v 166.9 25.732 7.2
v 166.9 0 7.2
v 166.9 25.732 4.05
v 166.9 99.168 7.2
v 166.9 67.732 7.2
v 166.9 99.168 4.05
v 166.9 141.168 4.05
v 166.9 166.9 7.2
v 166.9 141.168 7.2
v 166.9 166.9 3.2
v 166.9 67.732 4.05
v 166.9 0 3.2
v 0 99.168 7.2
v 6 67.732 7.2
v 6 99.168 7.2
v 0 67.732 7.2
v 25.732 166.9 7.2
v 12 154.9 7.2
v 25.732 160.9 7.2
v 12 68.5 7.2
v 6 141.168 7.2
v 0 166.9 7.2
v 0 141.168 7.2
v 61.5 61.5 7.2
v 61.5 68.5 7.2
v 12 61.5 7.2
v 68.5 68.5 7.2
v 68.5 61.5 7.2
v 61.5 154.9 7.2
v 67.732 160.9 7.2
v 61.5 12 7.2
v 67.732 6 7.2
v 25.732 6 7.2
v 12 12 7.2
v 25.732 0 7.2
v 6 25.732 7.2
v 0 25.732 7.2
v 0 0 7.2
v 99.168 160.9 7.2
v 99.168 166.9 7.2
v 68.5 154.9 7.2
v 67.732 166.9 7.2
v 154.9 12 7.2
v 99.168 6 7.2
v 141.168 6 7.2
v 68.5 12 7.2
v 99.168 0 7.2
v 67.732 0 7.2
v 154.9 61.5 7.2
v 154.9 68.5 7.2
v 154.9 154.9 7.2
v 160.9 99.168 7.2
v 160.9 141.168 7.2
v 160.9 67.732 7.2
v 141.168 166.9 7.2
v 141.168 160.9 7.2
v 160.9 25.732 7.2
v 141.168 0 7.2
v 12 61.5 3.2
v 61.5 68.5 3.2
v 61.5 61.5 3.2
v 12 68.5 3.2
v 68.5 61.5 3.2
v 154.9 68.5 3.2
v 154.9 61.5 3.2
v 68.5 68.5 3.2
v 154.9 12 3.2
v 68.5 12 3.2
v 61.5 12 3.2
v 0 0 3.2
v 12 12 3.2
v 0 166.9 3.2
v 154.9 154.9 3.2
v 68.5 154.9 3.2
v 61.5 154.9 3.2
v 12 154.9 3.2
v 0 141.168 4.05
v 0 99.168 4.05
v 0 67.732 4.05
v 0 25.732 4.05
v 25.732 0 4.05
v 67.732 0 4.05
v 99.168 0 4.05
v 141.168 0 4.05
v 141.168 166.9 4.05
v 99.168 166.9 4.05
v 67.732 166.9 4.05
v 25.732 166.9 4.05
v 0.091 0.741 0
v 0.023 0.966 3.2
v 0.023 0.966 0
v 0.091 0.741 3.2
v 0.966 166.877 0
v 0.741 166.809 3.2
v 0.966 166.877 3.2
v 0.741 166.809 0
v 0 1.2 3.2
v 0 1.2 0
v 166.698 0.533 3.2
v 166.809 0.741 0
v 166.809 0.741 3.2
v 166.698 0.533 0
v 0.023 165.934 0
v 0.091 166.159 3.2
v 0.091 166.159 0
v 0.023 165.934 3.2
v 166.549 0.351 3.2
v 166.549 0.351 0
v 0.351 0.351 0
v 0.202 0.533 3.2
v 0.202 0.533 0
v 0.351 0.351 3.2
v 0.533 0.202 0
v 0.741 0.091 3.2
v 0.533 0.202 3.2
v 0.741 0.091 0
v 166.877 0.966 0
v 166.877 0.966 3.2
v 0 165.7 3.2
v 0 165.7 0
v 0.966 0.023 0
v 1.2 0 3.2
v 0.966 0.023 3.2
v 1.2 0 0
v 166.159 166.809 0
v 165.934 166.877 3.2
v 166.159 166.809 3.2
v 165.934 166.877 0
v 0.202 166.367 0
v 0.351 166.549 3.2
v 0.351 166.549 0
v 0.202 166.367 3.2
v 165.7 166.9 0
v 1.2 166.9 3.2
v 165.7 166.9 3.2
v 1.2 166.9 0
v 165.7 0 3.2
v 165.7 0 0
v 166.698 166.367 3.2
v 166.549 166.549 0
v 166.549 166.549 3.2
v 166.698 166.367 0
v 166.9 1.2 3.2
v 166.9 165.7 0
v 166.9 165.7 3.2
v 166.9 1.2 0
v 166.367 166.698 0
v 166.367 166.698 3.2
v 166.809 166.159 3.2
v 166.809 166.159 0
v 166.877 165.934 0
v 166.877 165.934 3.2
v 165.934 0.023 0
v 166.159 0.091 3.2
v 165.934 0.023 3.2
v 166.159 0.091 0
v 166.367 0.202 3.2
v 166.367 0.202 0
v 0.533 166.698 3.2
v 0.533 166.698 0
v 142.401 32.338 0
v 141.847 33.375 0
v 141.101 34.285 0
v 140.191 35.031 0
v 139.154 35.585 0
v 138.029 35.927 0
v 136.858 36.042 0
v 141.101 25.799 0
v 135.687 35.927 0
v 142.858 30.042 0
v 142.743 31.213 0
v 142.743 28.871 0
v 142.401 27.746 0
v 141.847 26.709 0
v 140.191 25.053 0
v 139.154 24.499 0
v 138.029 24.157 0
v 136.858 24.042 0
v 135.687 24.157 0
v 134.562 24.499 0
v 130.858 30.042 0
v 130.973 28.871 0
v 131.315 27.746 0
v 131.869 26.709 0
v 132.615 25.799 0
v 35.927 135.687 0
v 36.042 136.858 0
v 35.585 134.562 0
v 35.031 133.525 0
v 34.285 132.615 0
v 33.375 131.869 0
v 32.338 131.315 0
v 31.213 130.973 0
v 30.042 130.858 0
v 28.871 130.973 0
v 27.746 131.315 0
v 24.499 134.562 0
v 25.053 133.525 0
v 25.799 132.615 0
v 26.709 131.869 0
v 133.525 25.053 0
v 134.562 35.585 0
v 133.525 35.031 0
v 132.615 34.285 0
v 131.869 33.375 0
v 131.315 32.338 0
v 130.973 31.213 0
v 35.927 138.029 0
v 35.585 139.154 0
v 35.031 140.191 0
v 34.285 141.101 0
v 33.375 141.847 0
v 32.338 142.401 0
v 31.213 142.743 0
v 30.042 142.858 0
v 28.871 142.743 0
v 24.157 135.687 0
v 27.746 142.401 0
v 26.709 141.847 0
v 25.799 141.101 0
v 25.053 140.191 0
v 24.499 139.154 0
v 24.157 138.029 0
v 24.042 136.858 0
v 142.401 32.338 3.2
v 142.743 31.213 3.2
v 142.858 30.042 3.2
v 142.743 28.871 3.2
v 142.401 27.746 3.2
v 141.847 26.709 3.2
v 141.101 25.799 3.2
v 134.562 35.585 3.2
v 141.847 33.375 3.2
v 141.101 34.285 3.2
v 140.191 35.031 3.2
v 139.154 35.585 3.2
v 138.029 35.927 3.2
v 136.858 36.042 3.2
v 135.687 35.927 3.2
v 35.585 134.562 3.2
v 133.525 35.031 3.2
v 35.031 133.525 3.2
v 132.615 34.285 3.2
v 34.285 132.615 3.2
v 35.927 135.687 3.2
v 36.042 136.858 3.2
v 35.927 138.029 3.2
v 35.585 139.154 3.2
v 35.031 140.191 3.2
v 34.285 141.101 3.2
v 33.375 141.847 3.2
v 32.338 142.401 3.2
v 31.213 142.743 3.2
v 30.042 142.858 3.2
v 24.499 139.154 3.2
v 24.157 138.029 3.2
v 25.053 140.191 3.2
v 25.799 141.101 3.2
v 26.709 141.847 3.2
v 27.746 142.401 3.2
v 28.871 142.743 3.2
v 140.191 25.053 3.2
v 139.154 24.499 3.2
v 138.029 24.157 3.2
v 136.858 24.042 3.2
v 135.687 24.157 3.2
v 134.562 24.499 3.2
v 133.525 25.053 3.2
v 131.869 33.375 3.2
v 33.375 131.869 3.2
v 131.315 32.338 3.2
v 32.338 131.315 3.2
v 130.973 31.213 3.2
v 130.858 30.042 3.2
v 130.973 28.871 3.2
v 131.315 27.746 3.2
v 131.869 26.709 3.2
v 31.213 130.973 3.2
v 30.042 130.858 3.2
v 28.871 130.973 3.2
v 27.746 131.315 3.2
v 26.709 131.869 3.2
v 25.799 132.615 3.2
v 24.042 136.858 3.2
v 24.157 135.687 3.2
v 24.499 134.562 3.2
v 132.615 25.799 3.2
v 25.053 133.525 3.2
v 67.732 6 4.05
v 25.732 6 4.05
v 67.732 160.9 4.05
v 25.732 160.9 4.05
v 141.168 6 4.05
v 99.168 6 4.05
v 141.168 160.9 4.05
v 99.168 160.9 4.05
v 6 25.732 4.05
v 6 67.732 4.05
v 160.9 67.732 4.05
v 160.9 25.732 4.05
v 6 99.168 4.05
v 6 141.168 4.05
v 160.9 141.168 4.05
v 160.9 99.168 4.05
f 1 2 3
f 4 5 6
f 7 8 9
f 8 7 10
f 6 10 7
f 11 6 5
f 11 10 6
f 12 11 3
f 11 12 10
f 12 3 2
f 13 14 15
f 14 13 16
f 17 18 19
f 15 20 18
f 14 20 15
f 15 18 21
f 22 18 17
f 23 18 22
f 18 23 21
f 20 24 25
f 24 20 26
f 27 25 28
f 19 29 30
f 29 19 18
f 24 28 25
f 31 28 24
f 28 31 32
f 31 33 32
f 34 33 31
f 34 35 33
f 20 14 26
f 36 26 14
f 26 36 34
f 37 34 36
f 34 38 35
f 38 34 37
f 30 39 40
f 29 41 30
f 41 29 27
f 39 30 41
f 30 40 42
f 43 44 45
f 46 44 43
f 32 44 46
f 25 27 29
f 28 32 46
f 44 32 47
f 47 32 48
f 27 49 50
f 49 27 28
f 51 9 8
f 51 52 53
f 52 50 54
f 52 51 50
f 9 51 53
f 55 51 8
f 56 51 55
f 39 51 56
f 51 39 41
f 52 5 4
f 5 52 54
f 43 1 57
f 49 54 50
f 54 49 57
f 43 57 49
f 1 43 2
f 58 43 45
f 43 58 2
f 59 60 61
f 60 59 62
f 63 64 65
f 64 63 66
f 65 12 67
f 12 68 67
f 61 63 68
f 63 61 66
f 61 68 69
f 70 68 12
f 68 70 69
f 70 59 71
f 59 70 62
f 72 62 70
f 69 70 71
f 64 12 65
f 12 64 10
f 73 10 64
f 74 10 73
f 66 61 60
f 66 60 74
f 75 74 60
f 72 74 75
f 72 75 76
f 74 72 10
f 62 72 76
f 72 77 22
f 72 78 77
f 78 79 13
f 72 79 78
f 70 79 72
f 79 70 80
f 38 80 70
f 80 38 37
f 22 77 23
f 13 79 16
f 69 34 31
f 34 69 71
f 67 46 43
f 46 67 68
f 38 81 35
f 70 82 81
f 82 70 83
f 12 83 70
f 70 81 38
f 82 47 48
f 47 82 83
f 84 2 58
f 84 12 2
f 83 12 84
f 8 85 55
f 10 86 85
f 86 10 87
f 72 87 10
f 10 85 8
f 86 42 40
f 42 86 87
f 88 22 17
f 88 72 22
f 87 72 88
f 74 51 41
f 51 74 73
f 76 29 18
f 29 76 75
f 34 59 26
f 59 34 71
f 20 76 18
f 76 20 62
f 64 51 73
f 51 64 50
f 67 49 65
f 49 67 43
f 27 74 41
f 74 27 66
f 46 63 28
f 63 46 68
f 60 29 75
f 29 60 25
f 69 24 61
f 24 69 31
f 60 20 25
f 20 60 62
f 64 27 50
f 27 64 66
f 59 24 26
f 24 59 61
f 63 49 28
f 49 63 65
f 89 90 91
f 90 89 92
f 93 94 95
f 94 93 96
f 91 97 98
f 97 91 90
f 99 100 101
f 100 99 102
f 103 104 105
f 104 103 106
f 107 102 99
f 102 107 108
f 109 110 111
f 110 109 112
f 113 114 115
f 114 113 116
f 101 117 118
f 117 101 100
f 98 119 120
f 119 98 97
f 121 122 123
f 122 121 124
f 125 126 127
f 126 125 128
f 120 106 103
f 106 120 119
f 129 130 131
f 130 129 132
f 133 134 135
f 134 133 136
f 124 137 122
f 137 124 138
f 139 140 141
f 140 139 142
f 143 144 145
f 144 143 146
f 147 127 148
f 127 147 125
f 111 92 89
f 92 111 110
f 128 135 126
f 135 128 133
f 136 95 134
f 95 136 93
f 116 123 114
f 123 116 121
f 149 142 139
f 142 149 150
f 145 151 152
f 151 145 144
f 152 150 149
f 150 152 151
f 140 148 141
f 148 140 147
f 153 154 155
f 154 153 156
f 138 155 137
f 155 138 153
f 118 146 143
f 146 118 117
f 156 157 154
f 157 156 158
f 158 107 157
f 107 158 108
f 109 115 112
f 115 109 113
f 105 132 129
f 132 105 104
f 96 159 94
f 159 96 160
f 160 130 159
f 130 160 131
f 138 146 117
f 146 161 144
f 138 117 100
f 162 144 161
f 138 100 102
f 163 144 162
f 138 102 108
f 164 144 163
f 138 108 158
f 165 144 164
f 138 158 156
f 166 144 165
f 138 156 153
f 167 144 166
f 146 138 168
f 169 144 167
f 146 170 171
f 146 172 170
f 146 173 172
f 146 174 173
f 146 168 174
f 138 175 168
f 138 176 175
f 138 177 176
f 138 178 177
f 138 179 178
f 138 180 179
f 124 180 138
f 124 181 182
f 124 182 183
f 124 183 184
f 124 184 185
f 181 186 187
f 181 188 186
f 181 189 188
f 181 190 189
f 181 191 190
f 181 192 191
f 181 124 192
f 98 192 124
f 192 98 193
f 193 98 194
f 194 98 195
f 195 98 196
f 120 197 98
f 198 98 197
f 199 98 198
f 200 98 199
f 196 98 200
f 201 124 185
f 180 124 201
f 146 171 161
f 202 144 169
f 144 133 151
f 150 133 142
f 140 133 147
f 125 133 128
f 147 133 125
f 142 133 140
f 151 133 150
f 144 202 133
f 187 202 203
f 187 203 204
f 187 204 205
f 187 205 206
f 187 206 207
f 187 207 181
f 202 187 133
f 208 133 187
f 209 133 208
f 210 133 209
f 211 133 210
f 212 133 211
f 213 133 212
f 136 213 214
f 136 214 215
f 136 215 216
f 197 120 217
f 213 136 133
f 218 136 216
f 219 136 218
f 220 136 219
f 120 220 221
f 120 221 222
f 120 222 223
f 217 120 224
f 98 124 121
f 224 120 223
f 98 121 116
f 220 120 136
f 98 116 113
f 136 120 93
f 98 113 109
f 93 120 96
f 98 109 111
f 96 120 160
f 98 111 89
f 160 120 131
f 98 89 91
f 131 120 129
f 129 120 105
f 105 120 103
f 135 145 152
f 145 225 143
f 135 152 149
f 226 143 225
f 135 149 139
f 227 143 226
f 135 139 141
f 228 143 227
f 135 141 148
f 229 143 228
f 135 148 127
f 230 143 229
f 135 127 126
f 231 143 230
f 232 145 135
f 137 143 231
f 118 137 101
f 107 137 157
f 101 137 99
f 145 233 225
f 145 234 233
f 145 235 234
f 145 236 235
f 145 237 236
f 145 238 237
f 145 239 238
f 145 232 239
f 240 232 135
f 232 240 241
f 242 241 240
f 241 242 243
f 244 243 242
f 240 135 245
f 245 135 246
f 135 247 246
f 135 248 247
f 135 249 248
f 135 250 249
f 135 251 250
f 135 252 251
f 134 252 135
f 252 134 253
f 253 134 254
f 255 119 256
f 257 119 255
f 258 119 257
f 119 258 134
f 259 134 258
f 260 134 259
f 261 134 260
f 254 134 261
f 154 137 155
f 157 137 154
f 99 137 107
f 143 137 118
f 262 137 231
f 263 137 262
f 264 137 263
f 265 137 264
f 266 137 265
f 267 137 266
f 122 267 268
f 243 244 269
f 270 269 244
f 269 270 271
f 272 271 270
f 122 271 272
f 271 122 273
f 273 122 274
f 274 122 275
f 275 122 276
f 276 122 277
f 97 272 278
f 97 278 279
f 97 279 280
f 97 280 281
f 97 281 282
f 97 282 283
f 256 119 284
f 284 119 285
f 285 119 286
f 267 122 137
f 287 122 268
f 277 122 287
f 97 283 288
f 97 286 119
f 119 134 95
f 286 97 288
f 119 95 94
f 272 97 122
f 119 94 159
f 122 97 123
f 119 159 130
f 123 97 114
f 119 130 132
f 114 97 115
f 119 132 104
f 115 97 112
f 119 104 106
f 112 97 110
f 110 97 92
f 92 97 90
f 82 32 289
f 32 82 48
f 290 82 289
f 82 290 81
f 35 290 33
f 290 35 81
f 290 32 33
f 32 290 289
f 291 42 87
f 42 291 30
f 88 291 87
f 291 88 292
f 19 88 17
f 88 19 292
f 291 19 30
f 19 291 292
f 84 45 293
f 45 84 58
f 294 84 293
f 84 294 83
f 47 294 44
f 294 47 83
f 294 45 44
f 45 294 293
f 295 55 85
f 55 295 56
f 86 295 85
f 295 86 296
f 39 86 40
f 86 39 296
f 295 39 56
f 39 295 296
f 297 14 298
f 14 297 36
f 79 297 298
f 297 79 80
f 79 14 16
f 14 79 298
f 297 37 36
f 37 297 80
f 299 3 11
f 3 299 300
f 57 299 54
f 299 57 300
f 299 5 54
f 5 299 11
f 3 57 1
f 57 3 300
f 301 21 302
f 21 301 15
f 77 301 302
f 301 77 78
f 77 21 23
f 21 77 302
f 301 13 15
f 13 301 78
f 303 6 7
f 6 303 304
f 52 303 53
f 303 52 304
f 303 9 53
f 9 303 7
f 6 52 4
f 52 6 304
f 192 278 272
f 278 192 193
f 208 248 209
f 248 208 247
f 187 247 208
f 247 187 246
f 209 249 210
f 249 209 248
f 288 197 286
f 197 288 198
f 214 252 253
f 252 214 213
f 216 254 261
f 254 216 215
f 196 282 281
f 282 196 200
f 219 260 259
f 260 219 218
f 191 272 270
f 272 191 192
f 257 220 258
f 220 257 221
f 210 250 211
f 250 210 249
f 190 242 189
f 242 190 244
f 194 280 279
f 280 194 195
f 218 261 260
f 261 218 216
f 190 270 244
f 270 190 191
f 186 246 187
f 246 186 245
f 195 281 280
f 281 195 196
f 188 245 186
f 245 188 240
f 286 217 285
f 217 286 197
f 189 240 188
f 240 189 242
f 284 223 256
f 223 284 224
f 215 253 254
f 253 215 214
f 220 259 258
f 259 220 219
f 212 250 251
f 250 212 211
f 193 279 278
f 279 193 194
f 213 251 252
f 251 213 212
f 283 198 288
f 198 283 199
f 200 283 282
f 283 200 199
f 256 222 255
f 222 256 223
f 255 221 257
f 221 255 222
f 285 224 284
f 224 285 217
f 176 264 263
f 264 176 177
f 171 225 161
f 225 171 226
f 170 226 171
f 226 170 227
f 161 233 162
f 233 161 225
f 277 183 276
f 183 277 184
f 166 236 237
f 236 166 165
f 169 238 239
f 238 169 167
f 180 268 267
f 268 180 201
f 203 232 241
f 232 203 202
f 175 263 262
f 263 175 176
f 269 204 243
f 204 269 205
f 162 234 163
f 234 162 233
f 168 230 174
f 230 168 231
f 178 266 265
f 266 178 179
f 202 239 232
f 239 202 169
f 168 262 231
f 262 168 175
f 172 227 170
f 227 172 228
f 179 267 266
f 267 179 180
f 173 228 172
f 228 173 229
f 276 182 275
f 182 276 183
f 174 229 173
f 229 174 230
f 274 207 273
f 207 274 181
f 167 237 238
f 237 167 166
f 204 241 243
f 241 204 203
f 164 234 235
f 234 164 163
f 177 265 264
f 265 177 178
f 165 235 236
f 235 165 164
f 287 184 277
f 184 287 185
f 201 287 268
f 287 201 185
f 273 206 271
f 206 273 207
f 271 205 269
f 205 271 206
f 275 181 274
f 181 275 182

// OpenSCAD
/*
Wall outer skin tile with foam fill/vent ports.
Print orientation: large flat outside face on the bed, ribs and key recesses upward.
Quantity: one upper tile per wall is the default assembly intent.
*/

use <../planter_support_free.scad>

export_wall_outer_tile_ported();
